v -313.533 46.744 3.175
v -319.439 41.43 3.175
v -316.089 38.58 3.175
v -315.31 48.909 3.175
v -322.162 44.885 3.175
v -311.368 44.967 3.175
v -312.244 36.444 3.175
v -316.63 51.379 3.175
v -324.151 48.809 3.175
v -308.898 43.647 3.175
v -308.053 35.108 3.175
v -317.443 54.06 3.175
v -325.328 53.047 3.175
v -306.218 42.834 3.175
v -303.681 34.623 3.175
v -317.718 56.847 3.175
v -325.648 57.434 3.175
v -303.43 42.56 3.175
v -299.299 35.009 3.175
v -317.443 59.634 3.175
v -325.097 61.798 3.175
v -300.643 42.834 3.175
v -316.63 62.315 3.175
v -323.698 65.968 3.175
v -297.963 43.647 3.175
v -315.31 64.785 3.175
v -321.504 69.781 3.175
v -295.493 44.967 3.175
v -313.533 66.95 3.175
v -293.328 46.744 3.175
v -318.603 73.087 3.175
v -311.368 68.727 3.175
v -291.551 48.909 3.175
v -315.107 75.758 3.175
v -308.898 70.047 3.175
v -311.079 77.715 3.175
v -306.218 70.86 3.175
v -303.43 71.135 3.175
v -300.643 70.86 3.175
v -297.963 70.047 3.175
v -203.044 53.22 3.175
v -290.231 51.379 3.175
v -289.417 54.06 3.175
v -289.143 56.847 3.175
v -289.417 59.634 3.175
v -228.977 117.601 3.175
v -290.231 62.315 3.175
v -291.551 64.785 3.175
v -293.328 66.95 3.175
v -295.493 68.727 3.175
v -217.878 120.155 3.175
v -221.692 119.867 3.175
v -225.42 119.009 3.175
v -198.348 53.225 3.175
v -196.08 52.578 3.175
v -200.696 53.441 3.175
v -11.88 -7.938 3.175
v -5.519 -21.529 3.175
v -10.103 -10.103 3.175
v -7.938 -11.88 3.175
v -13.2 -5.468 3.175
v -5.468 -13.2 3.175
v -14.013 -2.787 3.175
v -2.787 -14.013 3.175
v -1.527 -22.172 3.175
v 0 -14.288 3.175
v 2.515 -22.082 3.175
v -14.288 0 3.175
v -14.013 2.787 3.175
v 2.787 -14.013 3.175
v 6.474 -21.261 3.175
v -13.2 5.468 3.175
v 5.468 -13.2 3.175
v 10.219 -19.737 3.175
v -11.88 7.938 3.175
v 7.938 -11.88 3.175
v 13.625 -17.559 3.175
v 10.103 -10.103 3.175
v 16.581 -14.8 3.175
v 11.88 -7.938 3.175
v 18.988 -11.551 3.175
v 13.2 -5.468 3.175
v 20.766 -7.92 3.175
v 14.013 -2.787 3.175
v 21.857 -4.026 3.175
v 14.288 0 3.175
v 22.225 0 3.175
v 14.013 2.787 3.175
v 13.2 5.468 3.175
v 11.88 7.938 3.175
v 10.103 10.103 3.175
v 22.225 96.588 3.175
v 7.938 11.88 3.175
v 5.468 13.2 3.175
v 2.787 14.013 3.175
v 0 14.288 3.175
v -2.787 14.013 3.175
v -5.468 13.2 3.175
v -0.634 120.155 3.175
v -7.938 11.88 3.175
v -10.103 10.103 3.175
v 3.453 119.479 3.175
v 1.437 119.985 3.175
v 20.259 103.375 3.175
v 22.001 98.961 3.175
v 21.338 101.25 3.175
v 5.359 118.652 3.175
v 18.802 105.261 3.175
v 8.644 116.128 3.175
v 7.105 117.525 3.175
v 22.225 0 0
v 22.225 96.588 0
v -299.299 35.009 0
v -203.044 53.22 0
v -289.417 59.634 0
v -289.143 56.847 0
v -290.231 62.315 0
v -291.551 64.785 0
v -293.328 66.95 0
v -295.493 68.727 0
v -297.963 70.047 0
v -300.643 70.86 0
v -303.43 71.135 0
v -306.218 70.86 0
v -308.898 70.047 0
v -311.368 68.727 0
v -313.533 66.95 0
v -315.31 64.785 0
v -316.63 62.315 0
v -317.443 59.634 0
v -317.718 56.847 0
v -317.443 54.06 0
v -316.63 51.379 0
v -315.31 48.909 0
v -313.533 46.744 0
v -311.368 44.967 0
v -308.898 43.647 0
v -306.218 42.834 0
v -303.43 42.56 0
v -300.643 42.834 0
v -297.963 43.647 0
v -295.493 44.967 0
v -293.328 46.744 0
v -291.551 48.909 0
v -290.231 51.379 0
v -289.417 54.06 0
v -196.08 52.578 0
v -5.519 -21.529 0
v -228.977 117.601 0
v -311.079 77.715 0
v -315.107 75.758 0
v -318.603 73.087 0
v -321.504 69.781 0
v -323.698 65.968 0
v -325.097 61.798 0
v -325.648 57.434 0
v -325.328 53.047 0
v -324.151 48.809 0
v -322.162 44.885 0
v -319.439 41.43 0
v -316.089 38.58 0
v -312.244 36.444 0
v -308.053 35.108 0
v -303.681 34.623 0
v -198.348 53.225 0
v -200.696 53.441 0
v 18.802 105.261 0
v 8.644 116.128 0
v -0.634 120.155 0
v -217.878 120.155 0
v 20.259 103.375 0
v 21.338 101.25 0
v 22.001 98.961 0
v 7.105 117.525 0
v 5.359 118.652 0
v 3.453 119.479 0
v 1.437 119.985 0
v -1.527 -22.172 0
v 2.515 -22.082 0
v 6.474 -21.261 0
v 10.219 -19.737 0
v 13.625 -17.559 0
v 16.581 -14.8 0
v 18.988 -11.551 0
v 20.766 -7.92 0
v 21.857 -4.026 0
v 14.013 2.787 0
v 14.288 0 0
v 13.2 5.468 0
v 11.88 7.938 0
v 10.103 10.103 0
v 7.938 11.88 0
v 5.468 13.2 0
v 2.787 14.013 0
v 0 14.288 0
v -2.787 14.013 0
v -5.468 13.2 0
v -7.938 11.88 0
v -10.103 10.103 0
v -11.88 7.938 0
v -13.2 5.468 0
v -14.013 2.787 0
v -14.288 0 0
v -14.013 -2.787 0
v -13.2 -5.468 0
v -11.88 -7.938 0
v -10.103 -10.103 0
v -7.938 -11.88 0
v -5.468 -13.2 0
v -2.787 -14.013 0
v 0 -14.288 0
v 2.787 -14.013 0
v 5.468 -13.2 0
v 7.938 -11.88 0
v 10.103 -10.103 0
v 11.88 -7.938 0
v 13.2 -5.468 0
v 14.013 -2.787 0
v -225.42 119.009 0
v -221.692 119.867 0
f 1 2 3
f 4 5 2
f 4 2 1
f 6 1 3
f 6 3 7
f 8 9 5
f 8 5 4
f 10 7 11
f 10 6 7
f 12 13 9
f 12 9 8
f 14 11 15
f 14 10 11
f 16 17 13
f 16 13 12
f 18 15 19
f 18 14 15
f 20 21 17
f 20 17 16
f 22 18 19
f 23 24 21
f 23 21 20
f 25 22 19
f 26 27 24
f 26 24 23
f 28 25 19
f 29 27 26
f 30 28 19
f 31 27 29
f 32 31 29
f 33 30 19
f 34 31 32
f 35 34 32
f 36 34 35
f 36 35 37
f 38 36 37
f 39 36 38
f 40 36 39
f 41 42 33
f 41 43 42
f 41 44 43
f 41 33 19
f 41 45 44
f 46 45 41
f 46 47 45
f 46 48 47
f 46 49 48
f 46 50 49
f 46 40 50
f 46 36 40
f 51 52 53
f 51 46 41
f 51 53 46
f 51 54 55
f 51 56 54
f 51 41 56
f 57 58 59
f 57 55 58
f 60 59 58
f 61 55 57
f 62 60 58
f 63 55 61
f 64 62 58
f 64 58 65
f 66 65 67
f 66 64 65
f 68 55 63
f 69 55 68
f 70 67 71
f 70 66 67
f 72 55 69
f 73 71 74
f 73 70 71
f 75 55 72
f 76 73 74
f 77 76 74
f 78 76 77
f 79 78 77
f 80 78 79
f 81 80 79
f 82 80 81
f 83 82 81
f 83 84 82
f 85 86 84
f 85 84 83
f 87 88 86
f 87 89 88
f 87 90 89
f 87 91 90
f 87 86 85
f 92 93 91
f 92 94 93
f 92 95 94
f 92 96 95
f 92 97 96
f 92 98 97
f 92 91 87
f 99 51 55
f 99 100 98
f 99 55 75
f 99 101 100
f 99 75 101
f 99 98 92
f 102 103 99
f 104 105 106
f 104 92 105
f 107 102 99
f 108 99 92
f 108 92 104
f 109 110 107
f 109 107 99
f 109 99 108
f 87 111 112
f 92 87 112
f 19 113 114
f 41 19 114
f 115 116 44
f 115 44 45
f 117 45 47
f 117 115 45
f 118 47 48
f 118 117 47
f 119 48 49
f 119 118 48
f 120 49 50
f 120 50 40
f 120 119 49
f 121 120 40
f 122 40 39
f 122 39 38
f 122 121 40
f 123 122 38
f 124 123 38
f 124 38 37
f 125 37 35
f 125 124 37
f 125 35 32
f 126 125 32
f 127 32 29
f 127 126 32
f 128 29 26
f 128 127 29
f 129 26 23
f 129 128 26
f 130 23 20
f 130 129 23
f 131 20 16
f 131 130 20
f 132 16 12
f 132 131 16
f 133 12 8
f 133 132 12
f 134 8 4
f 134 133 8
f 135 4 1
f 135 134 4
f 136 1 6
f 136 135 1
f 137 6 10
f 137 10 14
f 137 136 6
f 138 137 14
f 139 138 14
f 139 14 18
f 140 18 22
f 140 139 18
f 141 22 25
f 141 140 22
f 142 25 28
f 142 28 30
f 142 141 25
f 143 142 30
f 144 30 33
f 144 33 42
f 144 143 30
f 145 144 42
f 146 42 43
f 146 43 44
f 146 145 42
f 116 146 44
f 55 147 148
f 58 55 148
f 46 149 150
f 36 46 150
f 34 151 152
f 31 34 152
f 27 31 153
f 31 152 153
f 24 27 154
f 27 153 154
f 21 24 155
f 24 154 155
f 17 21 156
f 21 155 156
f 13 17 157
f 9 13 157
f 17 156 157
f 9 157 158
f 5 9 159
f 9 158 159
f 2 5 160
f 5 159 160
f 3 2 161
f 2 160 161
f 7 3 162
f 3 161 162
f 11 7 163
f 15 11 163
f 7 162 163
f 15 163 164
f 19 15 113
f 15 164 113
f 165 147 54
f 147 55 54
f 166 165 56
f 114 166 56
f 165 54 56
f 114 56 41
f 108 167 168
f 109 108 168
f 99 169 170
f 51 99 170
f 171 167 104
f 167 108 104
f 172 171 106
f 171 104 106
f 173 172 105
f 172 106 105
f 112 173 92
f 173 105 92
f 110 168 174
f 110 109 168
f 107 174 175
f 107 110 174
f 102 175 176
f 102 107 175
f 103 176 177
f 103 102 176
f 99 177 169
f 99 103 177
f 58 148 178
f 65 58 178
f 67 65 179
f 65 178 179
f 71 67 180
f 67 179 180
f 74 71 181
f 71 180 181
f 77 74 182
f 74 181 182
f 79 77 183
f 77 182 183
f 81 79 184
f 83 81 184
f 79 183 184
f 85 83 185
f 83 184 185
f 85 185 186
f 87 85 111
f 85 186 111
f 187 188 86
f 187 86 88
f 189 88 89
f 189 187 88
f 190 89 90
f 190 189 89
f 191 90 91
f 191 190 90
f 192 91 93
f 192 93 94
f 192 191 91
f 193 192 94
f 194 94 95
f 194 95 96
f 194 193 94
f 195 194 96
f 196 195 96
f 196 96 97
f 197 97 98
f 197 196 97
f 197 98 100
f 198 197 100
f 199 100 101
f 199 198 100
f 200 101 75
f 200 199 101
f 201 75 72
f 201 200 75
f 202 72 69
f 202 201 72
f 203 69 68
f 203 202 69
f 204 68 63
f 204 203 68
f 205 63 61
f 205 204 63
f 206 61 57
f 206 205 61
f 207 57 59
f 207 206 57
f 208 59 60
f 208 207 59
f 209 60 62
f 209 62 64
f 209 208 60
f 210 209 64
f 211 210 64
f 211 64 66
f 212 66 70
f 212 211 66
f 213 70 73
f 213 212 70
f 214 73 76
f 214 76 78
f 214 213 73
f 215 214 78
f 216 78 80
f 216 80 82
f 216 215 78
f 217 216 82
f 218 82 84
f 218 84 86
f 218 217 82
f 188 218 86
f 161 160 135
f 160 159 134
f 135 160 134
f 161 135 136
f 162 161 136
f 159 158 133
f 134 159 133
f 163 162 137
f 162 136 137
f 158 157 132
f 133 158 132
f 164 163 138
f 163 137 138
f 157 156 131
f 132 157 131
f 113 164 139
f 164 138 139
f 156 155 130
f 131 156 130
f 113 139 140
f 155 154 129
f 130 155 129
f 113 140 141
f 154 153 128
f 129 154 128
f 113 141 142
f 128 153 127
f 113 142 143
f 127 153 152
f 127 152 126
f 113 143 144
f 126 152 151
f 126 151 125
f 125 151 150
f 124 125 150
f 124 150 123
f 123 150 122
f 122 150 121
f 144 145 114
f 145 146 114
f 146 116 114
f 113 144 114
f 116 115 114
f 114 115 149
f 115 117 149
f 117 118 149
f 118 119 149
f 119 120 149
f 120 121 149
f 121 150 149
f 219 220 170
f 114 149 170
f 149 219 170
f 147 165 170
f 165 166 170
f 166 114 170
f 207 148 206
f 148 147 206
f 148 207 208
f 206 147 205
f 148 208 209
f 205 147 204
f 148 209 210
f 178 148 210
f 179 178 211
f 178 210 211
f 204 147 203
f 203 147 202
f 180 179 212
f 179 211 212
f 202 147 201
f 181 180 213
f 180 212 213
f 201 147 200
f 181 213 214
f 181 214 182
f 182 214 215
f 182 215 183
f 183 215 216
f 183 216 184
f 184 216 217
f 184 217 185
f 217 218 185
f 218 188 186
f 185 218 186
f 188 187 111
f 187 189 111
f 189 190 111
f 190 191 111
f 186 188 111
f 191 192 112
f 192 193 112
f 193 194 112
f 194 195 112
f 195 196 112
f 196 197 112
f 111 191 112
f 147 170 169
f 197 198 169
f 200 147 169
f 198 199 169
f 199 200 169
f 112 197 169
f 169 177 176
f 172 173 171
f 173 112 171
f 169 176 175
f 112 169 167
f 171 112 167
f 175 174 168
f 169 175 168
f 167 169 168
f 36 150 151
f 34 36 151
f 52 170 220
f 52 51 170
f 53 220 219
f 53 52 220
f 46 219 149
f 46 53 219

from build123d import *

# Parameters (mm, degrees)
SKETCH1_R           = 14.2875
BOSS_EXTRUDE1_DEPTH = 3.175
FILLET1_R           = 12.7
FILLET2_R           = 25.4
FILLET3_R           = 12.7
FILLET4_R           = 12.7


with BuildPart() as part:
    # Sketch1 → Boss-Extrude1 (new body)
    with BuildSketch(Plane.XY):
        with BuildLine():
            ThreePointArc((-5.519049503, -21.528834562), (13.625155959, -17.558637479), (22.225, 0))
            Line((22.225, 0), (22.225, 101.6))
            Line((22.225, 101.6), (4.879081578, 120.154759877))
            Line((4.879081578, 120.154759877), (-223.720918422, 120.154759877))
            Line((-223.720918422, 120.154759877), (-311.078676661, 77.714630478))
            Line((-311.078676661, 77.714630478), (-315.107157175, 75.757514845))
            ThreePointArc((-315.107157175, 75.757514845), (-324.150818676, 48.808615563), (-299.298978098, 35.009448714))
            Line((-299.298978098, 35.009448714), (-199.469861892, 53.896151905))
            Line((-199.469861892, 53.896151905), (-5.519049503, -21.528834562))
        make_face()
        Circle(SKETCH1_R, mode=Mode.SUBTRACT)
        with Locations((-303.430444421, 56.847067884)):
            Circle(SKETCH1_R, mode=Mode.SUBTRACT)
    extrude(amount=BOSS_EXTRUDE1_DEPTH)

    # Fillet1
    fillet1_edges = [part.edges().sort_by_distance(p)[0] for p in [
        (-199.469861892, 53.896151905, 1.5875),
    ]]
    fillet(fillet1_edges, radius=FILLET1_R)

    # Fillet2
    fillet2_edges = [part.edges().sort_by_distance(p)[0] for p in [
        (-223.720918422, 120.154759877, 1.5875),
    ]]
    fillet(fillet2_edges, radius=FILLET2_R)

    # Fillet3
    fillet3_edges = [part.edges().sort_by_distance(p)[0] for p in [
        (22.225, 101.6, 1.5875),
    ]]
    fillet(fillet3_edges, radius=FILLET3_R)

    # Fillet4
    fillet4_edges = [part.edges().sort_by_distance(p)[0] for p in [
        (4.879081578, 120.154759877, 1.5875),
    ]]
    fillet(fillet4_edges, radius=FILLET4_R)


solid = part.part
